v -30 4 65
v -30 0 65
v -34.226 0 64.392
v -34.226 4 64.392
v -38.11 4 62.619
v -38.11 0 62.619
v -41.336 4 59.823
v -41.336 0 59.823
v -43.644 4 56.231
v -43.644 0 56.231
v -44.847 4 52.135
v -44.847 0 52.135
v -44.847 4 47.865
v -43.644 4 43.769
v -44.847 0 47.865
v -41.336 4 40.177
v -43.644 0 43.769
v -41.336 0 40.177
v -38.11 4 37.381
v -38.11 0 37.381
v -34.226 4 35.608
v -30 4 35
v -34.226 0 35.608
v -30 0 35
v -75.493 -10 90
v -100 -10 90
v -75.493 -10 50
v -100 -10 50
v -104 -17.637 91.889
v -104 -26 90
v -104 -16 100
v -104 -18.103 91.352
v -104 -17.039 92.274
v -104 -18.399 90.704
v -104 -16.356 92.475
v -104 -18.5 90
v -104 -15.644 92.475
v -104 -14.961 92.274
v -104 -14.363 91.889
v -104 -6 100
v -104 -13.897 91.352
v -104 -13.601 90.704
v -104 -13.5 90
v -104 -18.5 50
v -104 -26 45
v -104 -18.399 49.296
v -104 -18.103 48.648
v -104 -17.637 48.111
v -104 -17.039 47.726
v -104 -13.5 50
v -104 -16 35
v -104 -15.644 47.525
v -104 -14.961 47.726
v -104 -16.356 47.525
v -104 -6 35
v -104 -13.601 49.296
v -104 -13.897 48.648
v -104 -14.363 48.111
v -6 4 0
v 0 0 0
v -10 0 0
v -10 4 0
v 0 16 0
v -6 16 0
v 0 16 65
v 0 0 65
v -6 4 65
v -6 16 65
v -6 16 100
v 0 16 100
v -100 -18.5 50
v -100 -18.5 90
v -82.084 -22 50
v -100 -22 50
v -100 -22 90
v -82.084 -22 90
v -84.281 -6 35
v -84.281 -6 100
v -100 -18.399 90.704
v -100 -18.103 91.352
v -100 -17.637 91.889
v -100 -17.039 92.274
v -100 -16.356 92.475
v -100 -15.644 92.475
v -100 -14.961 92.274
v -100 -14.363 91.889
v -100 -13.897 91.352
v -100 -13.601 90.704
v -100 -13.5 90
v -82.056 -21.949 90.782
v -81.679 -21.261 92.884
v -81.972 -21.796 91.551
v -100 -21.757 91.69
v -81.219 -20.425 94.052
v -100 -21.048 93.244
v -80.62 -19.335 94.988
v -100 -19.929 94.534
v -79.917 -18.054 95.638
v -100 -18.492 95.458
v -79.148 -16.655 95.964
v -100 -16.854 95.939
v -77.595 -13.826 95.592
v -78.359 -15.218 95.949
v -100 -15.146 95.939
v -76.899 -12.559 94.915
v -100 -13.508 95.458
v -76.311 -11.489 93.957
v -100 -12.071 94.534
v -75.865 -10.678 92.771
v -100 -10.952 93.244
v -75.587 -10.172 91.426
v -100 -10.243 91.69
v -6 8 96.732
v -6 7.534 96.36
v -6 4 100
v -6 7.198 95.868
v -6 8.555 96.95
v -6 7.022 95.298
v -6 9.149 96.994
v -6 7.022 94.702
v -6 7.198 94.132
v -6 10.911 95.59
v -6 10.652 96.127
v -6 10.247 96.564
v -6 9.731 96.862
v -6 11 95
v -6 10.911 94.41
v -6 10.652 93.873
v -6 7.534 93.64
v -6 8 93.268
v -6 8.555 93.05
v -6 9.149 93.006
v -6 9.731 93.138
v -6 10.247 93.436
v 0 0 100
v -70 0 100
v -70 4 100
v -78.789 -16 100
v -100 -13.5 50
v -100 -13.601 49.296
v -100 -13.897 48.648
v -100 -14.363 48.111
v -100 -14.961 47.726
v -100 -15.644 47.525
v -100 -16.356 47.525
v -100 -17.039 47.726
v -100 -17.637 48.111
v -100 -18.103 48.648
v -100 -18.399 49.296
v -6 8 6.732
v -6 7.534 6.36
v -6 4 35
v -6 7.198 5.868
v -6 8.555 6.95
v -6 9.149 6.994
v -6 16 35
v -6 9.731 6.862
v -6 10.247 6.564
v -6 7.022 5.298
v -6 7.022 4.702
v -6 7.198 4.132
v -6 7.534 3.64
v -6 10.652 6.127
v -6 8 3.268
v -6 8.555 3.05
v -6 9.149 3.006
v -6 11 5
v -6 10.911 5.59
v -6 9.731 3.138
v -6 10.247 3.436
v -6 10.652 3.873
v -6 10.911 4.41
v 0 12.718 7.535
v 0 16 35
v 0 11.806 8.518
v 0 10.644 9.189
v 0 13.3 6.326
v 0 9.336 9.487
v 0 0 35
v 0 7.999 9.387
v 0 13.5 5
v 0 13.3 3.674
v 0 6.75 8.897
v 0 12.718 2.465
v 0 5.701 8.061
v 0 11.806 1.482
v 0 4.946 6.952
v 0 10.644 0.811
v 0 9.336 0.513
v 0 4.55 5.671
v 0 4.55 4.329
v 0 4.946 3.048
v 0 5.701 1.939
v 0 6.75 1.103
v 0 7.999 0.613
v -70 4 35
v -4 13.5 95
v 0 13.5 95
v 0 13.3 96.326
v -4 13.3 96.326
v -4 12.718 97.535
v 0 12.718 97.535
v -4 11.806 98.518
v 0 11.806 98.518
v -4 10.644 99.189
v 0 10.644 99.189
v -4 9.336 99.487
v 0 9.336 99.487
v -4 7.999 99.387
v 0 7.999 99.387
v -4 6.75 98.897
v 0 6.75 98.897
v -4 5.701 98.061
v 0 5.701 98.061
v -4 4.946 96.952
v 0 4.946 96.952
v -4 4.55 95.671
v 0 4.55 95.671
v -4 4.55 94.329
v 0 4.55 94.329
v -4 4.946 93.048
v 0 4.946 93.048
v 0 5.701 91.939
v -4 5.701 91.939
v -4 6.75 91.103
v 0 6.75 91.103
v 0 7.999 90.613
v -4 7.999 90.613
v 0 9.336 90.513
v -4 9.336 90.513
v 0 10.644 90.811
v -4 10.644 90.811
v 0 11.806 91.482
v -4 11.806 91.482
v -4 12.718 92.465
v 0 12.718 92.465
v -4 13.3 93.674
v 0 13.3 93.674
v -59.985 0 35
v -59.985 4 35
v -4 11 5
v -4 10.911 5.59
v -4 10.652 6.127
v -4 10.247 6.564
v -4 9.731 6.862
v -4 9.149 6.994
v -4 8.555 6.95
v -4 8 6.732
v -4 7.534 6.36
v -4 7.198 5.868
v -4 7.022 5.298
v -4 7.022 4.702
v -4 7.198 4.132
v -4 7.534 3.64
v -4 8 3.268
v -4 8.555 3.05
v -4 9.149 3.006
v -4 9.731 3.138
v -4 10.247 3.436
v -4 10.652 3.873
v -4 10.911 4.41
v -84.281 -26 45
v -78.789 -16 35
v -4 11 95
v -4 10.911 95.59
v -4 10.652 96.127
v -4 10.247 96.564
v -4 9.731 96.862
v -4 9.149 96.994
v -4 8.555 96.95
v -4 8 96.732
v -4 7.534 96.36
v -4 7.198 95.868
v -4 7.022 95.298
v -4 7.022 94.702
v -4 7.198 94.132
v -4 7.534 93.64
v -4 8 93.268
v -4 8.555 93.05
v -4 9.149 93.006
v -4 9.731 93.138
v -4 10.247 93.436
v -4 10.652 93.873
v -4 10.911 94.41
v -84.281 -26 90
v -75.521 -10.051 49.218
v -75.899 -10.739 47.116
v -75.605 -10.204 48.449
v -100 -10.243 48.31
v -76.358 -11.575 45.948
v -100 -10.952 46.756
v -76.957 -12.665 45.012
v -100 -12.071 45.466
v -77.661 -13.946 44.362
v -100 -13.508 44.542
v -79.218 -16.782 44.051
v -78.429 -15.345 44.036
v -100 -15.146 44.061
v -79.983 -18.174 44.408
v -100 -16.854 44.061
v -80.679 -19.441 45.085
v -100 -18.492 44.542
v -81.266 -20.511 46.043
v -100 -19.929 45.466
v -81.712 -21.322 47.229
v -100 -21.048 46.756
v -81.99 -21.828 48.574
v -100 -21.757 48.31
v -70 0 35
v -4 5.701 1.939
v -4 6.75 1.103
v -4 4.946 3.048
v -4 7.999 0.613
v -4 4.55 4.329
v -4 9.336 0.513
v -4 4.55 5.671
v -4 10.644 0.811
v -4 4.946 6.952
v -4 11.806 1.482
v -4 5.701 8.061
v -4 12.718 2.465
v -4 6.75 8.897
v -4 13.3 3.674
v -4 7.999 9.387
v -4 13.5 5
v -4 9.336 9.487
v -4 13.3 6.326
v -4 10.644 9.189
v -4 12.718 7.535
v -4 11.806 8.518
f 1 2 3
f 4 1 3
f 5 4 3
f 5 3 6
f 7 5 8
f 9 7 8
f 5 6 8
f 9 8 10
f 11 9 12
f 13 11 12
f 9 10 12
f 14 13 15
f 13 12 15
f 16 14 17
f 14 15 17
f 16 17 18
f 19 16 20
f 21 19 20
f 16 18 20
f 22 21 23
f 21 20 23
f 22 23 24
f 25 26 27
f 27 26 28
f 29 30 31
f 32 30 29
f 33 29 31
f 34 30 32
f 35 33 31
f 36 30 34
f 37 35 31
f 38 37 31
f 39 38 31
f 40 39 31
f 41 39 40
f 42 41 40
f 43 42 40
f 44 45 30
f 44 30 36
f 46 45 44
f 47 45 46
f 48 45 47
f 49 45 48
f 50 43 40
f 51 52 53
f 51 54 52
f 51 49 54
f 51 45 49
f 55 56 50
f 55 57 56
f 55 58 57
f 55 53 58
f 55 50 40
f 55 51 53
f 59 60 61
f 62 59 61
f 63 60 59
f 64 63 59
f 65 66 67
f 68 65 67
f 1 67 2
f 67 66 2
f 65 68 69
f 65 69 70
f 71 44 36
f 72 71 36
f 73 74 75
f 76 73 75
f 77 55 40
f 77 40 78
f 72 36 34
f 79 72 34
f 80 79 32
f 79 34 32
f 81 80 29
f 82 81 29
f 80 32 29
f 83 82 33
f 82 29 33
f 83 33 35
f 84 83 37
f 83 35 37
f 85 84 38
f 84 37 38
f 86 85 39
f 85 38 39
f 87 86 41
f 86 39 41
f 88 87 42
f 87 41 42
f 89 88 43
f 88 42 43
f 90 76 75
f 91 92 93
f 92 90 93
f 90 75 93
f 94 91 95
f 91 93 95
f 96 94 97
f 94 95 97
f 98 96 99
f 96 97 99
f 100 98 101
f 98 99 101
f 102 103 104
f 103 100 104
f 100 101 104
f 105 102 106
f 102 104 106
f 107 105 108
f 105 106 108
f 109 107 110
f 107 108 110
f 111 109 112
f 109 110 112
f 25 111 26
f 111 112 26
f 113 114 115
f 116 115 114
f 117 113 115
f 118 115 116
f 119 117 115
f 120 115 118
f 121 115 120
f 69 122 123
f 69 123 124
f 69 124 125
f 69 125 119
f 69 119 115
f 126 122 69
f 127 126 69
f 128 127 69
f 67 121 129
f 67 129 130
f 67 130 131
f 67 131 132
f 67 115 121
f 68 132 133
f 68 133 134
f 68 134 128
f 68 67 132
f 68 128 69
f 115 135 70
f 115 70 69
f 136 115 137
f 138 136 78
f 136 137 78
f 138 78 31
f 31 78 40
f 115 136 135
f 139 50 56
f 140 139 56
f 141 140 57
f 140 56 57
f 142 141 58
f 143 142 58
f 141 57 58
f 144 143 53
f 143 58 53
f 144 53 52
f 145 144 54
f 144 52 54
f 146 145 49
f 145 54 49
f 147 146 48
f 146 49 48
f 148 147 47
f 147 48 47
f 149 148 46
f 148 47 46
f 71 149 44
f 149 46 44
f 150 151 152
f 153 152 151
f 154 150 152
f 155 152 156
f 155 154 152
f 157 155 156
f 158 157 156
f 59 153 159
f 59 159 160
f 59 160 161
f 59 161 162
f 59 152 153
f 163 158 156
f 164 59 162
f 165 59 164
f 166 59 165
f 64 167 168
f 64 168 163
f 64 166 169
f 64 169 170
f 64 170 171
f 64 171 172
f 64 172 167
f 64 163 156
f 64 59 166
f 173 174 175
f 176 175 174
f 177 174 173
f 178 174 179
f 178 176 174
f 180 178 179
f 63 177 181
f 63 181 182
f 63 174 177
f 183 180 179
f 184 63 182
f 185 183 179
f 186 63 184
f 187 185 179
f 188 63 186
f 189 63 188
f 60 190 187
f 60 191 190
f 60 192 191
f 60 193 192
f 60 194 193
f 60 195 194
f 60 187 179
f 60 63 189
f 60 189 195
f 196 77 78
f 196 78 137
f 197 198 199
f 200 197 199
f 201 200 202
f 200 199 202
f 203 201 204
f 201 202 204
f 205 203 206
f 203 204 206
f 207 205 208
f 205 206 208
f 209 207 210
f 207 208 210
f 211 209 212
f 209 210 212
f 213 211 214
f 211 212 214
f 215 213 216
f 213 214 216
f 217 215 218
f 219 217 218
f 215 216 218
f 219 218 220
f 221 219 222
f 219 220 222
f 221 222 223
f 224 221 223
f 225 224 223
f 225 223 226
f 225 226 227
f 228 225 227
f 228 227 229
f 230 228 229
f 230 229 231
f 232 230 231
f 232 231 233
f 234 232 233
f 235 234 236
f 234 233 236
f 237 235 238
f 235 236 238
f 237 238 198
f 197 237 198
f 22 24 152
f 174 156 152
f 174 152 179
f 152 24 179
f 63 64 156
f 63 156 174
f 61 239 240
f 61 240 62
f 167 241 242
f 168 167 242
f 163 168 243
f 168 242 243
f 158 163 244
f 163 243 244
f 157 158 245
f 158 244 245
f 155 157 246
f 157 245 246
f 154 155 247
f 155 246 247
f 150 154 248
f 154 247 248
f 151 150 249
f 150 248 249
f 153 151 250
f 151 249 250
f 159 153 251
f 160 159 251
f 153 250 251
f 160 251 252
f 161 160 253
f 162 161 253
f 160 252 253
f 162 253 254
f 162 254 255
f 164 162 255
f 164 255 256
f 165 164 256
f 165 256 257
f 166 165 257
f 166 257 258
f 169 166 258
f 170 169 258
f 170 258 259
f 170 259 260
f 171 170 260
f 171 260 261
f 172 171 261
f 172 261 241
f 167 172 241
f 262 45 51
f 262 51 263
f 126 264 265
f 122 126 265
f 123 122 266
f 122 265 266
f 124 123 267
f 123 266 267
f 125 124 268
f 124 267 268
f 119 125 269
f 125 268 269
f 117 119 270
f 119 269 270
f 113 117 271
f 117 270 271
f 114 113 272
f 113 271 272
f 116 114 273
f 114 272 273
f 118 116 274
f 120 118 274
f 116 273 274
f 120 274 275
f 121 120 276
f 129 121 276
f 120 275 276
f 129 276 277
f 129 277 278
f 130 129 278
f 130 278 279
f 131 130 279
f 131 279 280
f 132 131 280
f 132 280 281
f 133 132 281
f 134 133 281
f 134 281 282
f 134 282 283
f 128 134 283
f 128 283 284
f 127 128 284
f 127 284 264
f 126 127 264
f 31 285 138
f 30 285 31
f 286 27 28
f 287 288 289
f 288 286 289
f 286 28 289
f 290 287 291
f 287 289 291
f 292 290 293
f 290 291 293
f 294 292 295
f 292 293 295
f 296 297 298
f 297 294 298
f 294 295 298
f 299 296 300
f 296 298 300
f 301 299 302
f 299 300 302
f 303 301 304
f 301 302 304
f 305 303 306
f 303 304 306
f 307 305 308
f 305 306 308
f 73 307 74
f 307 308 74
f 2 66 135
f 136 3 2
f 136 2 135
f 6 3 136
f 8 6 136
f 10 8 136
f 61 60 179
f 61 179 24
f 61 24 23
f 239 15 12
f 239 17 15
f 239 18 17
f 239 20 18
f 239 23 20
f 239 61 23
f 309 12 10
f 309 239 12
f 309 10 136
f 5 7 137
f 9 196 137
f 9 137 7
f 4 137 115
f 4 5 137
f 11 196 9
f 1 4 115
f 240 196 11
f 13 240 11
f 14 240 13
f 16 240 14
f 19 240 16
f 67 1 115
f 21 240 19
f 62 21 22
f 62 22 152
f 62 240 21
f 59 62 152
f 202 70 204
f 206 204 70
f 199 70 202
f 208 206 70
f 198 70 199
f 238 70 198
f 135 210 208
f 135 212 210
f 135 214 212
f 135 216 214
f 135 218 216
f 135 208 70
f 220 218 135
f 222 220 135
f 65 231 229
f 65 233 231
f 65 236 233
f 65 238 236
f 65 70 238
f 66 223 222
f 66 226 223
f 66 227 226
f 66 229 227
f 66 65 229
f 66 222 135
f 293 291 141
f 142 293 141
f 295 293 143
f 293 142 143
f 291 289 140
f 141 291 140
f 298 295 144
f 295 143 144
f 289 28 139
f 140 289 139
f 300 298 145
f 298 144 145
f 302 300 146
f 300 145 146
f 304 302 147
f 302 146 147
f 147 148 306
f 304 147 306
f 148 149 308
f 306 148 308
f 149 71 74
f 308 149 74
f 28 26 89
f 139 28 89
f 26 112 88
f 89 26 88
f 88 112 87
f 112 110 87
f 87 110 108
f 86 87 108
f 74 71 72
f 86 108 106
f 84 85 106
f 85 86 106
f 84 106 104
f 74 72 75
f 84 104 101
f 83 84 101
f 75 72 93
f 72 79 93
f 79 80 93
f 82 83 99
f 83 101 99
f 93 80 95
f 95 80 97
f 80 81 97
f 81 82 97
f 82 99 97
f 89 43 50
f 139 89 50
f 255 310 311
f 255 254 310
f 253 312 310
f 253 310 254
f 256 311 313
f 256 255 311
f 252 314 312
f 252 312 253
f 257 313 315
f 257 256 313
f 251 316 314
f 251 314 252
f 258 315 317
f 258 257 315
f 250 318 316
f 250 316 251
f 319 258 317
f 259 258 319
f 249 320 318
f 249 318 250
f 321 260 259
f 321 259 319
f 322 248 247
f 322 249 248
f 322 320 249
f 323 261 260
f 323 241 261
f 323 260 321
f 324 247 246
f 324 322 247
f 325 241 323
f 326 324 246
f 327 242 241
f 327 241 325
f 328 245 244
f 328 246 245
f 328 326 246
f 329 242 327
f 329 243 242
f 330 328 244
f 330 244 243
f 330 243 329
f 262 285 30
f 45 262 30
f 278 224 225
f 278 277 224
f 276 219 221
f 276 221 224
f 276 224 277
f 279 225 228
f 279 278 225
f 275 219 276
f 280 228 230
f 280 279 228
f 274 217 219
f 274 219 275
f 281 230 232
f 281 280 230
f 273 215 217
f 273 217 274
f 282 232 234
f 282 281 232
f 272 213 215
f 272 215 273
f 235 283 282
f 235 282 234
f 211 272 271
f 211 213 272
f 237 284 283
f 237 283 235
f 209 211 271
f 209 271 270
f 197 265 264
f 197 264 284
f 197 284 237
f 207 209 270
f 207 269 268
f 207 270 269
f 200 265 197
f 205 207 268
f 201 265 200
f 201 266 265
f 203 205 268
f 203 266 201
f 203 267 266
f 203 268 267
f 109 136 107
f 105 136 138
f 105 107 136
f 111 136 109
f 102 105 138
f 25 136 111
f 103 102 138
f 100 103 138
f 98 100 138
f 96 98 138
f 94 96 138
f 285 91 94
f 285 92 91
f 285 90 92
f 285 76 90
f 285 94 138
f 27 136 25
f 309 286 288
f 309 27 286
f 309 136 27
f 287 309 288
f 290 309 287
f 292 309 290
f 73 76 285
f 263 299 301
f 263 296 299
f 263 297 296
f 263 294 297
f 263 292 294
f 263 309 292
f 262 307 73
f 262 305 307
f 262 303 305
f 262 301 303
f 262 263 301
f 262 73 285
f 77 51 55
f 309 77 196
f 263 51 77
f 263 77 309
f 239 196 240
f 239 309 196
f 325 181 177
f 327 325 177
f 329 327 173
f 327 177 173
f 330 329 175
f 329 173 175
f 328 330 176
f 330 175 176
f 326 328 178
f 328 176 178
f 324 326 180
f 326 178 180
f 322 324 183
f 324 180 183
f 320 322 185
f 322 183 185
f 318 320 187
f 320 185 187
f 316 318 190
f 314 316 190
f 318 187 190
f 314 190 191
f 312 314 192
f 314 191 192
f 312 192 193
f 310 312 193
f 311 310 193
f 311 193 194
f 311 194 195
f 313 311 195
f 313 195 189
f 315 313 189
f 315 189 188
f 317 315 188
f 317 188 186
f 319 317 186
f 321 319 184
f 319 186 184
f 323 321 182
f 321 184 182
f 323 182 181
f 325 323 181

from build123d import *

# Parameters (mm, degrees)
PAD_DEPTH       = 100
SKETCH001_R     = 2
POCKET_DEPTH    = 104.001
SKETCH002_R     = 4.5
POCKET001_DEPTH = 4
POCKET002_DEPTH = 104.001
POCKET003_DEPTH = 100.001
POCKET004_DEPTH = 42.001
CHAMFER_SIZE    = 10
POCKET005_DEPTH = 16.001


with BuildPart() as part:
    # Sketch → Pad (new body)
    with BuildSketch(Plane.XY):
        Polygon((0, 0), (-70, 0), (-84.28148, -26), (-104, -26), (-104, -6), (-84.28148, -6), (-70, 4), (-6, 4), (-6, 16), (0, 16), align=None)
    extrude(amount=PAD_DEPTH)

    # Sketch001 (on Face10 of Pad) → Pocket (cut, through all)
    with BuildSketch(Plane.YZ):
        with Locations((9, 95)):
            Circle(SKETCH001_R)
        with Locations((9, 5)):
            Circle(SKETCH001_R)
    extrude(amount=-POCKET_DEPTH, mode=Mode.SUBTRACT)

    # Sketch002 (on Face2 of Pocket) → Pocket001 (cut)
    with BuildSketch(Plane.YZ):
        with Locations((9, 95)):
            Circle(SKETCH002_R)
        with Locations((9, 5)):
            Circle(SKETCH002_R)
    extrude(amount=-POCKET001_DEPTH, mode=Mode.SUBTRACT)

    # Sketch003 (on Face10 of Pocket001) → Pocket002 (cut, through all)
    with BuildSketch(Plane(origin=(-104, 0, 0), x_dir=(0, -1, 0), z_dir=(-1, 0, 0))):
        with BuildLine():
            ThreePointArc((18.5, 90), (16, 92.5), (13.5, 90))
            Line((13.5, 90), (13.5, 50))
            ThreePointArc((13.5, 50), (16, 47.5), (18.5, 50))
            Line((18.5, 50), (18.5, 90))
        make_face()
    extrude(amount=-POCKET002_DEPTH, mode=Mode.SUBTRACT)

    # Sketch004 (on Face14 of Pocket002) → Pocket003 (cut, through all)
    with BuildSketch(Plane(origin=(-100, 0, 0), x_dir=(0, -1, 0), z_dir=(-1, 0, 0))):
        with BuildLine():
            ThreePointArc((22, 90), (16, 96), (10, 90))
            Line((10, 90), (10, 50))
            ThreePointArc((10, 50), (16, 44), (22, 50))
            Line((22, 50), (22, 90))
        make_face()
    extrude(amount=-POCKET003_DEPTH, mode=Mode.SUBTRACT)

    # Sketch005 (on Face9 of Pocket003) → Pocket004 (cut, through all)
    with BuildSketch(Plane.XZ.offset(26)):
        Polygon((-104, 0), (-104, 35), (-59.98518, 35), (-10, 0), align=None)
    extrude(amount=-POCKET004_DEPTH, mode=Mode.SUBTRACT)

    # Chamfer
    chamfer_edges = [part.edges().sort_by_distance(p)[0] for p in [
        (-94.14074, -26, 100),
        (-94.14074, -26, 35),
    ]]
    chamfer(chamfer_edges, length=CHAMFER_SIZE)

    # Sketch006 (on Face4 of Chamfer) → Pocket005 (cut, through all)
    with BuildSketch(Plane.XZ):
        with BuildLine():
            ThreePointArc((0, 35), (15, 50), (0, 65))
            Line((0, 65), (-30, 65))
            ThreePointArc((-30, 65), (-45, 50), (-30, 35))
            Line((-30, 35), (0, 35))
        make_face()
    extrude(amount=-POCKET005_DEPTH, mode=Mode.SUBTRACT)


solid = part.part
